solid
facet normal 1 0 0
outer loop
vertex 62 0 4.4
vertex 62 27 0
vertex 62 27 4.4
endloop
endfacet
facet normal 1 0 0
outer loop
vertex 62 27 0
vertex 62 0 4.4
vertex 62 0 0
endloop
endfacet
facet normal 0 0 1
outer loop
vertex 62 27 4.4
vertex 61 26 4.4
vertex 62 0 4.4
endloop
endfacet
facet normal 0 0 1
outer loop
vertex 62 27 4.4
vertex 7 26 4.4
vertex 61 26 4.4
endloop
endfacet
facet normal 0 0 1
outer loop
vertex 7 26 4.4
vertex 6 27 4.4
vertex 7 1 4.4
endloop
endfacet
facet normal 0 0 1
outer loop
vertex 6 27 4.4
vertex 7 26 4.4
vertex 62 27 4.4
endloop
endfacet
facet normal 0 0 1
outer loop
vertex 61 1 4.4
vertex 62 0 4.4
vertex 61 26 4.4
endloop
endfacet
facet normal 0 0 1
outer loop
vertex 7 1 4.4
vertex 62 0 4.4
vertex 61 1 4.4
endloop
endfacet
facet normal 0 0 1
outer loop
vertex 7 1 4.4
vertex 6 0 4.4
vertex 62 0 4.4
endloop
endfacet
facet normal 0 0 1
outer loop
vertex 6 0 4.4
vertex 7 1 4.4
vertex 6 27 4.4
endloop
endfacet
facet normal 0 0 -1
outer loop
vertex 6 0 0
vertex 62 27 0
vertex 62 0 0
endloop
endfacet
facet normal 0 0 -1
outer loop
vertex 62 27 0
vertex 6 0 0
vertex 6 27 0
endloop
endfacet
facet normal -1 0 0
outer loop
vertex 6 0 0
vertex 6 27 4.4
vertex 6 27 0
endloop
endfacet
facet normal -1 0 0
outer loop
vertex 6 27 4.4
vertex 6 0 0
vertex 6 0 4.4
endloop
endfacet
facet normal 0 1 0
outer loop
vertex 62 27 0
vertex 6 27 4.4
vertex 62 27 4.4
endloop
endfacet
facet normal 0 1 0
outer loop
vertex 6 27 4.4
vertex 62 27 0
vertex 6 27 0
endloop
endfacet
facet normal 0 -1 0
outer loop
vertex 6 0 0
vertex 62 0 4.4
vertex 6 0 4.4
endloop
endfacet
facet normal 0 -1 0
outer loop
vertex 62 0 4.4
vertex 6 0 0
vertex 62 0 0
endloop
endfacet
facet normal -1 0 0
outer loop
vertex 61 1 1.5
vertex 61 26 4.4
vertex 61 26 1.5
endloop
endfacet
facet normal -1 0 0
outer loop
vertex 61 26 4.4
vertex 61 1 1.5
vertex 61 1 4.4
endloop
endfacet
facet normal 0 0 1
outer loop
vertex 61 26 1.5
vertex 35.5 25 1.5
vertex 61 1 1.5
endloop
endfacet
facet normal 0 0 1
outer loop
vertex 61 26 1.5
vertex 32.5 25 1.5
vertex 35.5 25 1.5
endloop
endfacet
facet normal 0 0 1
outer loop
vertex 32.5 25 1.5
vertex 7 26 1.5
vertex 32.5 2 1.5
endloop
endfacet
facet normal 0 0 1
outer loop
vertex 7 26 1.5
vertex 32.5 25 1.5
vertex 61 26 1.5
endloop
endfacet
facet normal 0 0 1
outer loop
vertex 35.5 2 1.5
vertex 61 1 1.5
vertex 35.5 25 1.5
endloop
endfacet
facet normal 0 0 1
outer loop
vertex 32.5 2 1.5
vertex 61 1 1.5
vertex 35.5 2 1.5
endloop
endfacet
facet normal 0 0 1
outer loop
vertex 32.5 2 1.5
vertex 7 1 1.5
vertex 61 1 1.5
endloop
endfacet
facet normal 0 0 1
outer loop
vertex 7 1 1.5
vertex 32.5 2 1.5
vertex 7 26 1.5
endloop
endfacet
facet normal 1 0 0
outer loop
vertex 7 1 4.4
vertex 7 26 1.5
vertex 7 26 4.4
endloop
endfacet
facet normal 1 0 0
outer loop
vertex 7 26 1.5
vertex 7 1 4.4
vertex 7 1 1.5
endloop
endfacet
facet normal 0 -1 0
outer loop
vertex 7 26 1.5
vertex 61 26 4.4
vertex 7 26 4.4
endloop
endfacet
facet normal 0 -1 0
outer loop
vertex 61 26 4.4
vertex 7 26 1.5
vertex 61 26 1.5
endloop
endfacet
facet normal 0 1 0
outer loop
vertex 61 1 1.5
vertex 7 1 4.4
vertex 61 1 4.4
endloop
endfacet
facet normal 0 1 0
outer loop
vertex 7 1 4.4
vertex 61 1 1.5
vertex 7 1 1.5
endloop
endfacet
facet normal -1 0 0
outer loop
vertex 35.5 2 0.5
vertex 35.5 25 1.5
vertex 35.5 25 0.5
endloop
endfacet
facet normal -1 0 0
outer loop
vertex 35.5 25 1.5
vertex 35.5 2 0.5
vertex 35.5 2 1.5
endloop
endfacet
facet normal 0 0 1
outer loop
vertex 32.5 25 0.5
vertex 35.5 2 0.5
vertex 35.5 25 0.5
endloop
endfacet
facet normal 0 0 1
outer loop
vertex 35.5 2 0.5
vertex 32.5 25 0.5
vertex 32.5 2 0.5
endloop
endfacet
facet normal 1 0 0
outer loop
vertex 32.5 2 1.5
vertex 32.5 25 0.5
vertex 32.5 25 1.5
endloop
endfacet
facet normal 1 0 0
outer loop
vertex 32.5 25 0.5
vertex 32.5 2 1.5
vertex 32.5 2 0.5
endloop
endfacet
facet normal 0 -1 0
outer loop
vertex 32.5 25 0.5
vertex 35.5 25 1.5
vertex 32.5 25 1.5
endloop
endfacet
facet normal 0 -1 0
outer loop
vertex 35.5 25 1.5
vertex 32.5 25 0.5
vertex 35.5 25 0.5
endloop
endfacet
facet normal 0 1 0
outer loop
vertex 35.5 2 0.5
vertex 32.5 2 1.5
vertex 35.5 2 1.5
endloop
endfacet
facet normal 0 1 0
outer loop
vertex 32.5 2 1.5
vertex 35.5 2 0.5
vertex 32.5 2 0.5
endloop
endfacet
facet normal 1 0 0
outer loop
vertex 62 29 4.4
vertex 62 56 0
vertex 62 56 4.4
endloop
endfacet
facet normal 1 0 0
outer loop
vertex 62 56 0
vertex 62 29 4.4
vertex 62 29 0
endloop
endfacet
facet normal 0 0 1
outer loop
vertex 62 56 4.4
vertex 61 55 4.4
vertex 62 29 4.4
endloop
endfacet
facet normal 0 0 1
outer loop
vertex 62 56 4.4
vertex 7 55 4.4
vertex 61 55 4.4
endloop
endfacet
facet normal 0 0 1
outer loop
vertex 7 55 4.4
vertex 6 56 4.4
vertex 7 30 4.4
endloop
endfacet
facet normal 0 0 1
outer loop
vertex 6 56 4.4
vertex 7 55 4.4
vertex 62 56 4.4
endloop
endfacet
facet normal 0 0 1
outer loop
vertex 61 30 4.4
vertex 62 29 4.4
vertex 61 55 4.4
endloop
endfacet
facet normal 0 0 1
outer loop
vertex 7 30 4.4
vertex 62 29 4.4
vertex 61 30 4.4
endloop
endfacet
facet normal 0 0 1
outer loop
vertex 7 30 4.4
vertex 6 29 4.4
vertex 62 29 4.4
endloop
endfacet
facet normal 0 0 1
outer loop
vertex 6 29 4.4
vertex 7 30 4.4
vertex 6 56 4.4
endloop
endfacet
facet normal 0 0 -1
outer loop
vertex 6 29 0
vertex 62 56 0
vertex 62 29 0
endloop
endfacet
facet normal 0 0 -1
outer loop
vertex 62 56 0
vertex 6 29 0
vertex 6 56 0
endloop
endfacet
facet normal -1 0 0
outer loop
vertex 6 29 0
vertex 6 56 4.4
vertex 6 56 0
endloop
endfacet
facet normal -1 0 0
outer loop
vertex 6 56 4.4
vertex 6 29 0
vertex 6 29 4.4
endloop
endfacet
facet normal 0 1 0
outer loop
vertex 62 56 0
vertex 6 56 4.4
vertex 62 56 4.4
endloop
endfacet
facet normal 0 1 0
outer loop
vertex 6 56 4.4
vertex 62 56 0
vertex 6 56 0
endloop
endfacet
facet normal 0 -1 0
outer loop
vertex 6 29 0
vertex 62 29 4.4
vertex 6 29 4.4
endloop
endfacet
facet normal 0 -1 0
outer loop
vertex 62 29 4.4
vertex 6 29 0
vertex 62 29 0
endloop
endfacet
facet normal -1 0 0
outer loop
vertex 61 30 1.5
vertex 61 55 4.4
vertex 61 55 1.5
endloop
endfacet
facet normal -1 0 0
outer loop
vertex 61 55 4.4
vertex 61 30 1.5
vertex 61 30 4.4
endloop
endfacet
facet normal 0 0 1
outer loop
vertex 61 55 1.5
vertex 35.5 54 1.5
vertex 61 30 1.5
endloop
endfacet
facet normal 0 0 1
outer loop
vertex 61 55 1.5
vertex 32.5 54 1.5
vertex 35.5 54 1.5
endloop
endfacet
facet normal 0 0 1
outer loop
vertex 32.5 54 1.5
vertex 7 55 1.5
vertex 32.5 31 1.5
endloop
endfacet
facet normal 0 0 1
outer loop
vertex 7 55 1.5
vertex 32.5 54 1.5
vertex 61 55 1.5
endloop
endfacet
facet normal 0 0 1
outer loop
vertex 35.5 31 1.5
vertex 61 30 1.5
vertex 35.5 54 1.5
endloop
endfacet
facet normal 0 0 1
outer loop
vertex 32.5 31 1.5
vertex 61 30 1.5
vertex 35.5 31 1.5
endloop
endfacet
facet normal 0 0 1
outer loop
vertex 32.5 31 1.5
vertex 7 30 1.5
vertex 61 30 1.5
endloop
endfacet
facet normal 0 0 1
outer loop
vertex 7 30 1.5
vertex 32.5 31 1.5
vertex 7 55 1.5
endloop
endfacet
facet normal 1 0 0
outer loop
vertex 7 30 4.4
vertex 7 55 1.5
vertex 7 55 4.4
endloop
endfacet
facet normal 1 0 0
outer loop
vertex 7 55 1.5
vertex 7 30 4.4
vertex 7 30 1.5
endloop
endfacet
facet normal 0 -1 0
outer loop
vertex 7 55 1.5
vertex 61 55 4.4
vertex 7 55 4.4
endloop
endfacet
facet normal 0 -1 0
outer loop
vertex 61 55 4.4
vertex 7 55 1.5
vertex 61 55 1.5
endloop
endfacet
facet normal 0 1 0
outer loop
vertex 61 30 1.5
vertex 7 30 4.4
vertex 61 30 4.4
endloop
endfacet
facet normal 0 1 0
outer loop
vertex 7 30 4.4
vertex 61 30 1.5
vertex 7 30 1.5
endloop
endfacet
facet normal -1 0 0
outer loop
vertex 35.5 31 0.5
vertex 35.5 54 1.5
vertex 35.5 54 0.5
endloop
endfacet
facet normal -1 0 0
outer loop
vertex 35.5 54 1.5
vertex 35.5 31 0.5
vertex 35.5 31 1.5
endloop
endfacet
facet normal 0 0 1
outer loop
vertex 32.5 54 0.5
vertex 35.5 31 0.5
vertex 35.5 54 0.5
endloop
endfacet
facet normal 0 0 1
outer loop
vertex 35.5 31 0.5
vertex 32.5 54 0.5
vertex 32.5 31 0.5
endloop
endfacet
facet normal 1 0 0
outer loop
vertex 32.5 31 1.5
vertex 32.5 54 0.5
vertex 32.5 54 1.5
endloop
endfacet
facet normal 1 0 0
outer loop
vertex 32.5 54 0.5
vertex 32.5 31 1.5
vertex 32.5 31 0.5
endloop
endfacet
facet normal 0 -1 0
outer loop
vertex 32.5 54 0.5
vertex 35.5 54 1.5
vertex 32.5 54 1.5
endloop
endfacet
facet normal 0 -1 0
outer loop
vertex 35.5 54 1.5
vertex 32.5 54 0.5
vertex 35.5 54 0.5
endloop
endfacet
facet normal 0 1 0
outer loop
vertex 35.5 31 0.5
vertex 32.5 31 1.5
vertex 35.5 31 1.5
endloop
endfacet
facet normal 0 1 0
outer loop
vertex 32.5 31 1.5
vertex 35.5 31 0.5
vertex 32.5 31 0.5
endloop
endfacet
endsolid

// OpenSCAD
// tripped-down version of toy_satelite_model
eps = 0.01;
magnet_size = [5,5,1];
magnet_slot_size = magnet_size + 0.5*[0,1,0] + eps*[0,0,1];
pv_size = [52, 19, 0.4];
pv_wall_side = 1;
pv_wall_bottom = 2;
pv_spacing = 1;
pv_cable_space = 4;
pv_mount_size = pv_size +
                2*pv_wall_side*[1,1,0] +
                2*pv_spacing*[1,1,0] +
                [0, pv_cable_space, 0] +
                [0, 0, pv_wall_bottom];
pv_mount_block_size = [magnet_size[0]+1, magnet_size[1]+2*(0.5/2+1), 7];



module pv_panel_mock()
{
  // main body
  cube(pv_size);
  // +/- cables
  for(dz=[ pv_size[2], -1 ])
    translate([pv_size[0]/2 - 1/2, 3, dz])
      cube([1, pv_size[1], 1]);
}


module pv_panel_mount()
{
  module pv_holder()
  {
    pv_pos_h = pv_mount_size[2]-pv_size[2]-0.5;
    extra_h = 2;
    difference()
    {
      cube(pv_mount_size + [0, 0, extra_h]);
      // panel cut-in
      translate([1, 1, pv_pos_h])
        cube(pv_mount_size - 2*pv_wall_side*[1,1,0] + [0, 0, extra_h]);
      // bottom cable cut-in
      translate([pv_size[0]/2 +1/2, pv_wall_side+pv_spacing, pv_pos_h-1])
        cube([3, pv_size[1]+pv_cable_space, 1+5]);
    }
    translate([1, 1, pv_pos_h] + pv_spacing*[1,1,0])
      %pv_panel_mock();
  }

  translate([pv_mount_block_size[0], 0, 0])
    pv_holder();
}

for(i=[0:1])
  translate([0, i*(pv_mount_size[1]+2), 0])
    pv_panel_mount();
